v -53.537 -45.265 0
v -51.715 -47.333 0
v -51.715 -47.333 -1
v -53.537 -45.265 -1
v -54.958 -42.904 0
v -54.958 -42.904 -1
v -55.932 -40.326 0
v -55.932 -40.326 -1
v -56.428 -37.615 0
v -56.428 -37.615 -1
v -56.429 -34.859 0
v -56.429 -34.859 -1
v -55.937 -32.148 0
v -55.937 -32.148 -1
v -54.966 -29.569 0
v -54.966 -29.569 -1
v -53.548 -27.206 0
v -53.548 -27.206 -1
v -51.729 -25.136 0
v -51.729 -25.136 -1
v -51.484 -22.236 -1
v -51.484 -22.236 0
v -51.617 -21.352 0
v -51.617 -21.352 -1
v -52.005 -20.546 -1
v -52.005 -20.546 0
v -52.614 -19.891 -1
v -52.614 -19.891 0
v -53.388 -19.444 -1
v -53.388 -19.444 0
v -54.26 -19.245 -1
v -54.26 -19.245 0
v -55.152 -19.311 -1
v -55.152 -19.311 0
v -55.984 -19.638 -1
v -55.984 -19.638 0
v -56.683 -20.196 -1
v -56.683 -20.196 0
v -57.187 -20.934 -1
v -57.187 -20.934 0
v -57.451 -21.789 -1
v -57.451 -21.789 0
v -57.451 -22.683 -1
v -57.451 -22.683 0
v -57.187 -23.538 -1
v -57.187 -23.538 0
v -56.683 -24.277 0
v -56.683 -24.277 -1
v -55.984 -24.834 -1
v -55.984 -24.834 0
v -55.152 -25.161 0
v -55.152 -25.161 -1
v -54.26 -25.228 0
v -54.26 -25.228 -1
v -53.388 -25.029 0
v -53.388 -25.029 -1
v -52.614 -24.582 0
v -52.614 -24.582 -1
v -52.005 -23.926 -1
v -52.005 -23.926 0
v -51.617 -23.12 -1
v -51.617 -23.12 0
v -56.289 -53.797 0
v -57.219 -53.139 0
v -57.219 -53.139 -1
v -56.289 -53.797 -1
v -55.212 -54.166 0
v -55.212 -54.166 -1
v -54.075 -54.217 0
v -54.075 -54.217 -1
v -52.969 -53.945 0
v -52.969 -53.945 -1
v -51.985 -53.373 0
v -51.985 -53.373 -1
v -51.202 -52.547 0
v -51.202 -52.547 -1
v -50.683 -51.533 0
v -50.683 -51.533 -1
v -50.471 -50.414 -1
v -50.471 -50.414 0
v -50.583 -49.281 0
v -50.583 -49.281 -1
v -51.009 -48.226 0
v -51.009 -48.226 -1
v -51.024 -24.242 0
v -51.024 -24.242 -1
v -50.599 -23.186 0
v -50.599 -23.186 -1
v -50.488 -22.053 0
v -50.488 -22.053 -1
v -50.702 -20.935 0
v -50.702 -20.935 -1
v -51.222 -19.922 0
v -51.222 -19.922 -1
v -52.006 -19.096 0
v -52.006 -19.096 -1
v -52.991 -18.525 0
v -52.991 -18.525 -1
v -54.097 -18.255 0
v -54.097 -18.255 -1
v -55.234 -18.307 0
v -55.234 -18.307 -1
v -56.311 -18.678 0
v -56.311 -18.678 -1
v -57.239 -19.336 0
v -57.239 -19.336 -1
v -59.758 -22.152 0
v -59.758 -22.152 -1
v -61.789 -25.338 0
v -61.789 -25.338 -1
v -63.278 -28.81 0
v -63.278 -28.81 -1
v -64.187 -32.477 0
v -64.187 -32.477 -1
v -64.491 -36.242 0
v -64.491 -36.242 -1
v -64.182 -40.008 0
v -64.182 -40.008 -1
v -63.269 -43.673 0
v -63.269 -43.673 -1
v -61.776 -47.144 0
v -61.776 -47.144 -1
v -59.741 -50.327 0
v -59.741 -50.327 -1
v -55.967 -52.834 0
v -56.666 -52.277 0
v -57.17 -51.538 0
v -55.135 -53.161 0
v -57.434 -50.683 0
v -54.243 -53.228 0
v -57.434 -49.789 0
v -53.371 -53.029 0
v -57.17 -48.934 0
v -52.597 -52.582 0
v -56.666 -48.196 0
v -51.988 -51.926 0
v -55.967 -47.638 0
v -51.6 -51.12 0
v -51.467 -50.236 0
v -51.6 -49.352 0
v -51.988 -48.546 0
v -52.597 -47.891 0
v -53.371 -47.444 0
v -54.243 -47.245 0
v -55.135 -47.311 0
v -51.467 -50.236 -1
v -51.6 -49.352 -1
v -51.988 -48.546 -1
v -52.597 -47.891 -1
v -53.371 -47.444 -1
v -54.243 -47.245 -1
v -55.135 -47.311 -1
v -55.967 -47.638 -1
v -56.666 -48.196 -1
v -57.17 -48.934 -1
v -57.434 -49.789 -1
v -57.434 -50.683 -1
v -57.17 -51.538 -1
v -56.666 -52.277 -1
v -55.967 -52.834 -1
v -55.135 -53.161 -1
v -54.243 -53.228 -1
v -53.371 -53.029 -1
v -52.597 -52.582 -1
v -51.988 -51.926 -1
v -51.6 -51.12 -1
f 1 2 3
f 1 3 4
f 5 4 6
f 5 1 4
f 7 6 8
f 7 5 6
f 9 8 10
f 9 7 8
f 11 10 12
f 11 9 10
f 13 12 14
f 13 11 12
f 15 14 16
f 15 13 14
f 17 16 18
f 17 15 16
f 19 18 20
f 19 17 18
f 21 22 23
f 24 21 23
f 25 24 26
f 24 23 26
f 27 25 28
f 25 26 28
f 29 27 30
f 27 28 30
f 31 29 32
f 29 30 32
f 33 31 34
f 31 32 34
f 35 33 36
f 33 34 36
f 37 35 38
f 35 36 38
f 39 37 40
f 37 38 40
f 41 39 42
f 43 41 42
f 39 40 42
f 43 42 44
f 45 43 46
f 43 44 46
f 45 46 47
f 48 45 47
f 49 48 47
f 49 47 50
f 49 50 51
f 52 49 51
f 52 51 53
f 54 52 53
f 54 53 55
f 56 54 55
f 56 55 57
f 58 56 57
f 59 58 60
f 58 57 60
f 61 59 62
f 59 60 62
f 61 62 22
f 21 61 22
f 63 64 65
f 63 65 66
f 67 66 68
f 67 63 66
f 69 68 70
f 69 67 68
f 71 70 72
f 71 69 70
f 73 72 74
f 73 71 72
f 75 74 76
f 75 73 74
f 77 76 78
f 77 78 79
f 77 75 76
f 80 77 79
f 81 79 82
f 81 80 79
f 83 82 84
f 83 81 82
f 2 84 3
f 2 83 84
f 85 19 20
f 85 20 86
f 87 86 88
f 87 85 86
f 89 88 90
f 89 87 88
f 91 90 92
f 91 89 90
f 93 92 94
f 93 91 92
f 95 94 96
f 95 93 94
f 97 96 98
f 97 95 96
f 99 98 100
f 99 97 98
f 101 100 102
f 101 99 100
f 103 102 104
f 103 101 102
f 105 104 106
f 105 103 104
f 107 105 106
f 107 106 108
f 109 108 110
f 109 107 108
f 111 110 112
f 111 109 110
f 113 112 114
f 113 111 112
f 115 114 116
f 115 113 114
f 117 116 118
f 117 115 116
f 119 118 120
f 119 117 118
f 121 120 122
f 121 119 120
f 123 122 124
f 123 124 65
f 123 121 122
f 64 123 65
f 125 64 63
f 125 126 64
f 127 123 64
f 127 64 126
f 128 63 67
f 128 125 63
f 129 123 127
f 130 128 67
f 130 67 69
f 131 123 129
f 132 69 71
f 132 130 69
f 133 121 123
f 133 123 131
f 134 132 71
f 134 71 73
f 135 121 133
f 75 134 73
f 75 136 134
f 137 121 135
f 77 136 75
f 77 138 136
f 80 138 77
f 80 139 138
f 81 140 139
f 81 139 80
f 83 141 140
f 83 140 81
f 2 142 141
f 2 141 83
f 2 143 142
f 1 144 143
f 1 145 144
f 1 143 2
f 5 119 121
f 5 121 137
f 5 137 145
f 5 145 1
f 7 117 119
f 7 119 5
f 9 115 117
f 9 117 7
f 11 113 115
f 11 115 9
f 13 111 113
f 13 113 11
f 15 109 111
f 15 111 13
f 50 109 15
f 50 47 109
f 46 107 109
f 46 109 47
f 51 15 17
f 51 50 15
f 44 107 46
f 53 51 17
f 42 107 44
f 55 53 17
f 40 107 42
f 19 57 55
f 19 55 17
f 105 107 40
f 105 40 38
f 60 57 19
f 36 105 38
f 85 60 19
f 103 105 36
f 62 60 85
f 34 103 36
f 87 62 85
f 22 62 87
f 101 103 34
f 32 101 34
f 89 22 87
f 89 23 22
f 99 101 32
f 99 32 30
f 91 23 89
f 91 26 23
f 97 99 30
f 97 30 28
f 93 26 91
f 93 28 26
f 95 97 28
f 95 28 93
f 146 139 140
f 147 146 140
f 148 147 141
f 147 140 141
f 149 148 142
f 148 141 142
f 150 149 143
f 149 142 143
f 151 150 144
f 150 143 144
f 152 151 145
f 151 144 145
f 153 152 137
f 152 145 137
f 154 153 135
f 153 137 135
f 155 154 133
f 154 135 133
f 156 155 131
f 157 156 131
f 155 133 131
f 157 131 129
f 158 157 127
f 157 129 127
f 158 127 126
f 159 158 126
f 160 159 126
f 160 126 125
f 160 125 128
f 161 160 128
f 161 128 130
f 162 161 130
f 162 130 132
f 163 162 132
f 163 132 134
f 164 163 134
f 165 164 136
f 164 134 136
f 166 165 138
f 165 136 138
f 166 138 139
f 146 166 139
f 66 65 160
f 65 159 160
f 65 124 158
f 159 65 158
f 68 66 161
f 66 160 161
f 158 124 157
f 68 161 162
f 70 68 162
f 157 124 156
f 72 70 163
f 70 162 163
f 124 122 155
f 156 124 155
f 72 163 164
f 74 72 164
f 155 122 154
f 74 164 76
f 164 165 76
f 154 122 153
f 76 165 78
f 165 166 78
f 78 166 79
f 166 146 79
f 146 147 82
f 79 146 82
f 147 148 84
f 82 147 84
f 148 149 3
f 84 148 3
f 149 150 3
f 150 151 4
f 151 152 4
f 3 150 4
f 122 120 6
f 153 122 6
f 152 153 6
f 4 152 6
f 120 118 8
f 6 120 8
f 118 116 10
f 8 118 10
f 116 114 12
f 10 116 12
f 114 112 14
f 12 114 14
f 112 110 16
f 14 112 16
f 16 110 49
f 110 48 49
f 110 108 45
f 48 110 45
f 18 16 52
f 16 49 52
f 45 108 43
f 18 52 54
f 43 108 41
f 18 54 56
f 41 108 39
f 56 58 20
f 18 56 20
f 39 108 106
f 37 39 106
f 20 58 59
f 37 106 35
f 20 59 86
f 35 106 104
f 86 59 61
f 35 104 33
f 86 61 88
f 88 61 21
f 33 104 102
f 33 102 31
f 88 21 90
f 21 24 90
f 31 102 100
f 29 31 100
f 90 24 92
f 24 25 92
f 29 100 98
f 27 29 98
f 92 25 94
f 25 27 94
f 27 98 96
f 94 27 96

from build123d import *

# Parameters (mm, degrees)
ESQUISSE1_R               = 3
T_LE_DE_BASE_PLI_E1_DEPTH = 1


# Sheet-metal steps are written as plain solids
with BuildPart() as part:
    # Esquisse1 → Tôle de base pliée1 (new body)
    with BuildSketch(Plane.XY):
        with BuildLine():
            ThreePointArc((-57.239284083, -19.336263861), (-64.490656247, -36.242246604), (-57.218655547, -53.139366375))
            ThreePointArc((-57.218655547, -53.139366375), (-51.563834313, -52.987719377), (-51.715481312, -47.332898143))
            ThreePointArc((-51.715481312, -47.332898143), (-56.490657737, -36.237364559), (-51.729027089, -25.136011084))
            ThreePointArc((-51.729027089, -25.136011084), (-51.584281974, -19.481008975), (-57.239284083, -19.336263861))
        make_face()
        with Locations((-54.484155586, -22.236137473)):
            Circle(ESQUISSE1_R, mode=Mode.SUBTRACT)
        with Locations((-54.467068429, -50.236132259)):
            Circle(ESQUISSE1_R, mode=Mode.SUBTRACT)
    extrude(amount=-T_LE_DE_BASE_PLI_E1_DEPTH)


solid = part.part
